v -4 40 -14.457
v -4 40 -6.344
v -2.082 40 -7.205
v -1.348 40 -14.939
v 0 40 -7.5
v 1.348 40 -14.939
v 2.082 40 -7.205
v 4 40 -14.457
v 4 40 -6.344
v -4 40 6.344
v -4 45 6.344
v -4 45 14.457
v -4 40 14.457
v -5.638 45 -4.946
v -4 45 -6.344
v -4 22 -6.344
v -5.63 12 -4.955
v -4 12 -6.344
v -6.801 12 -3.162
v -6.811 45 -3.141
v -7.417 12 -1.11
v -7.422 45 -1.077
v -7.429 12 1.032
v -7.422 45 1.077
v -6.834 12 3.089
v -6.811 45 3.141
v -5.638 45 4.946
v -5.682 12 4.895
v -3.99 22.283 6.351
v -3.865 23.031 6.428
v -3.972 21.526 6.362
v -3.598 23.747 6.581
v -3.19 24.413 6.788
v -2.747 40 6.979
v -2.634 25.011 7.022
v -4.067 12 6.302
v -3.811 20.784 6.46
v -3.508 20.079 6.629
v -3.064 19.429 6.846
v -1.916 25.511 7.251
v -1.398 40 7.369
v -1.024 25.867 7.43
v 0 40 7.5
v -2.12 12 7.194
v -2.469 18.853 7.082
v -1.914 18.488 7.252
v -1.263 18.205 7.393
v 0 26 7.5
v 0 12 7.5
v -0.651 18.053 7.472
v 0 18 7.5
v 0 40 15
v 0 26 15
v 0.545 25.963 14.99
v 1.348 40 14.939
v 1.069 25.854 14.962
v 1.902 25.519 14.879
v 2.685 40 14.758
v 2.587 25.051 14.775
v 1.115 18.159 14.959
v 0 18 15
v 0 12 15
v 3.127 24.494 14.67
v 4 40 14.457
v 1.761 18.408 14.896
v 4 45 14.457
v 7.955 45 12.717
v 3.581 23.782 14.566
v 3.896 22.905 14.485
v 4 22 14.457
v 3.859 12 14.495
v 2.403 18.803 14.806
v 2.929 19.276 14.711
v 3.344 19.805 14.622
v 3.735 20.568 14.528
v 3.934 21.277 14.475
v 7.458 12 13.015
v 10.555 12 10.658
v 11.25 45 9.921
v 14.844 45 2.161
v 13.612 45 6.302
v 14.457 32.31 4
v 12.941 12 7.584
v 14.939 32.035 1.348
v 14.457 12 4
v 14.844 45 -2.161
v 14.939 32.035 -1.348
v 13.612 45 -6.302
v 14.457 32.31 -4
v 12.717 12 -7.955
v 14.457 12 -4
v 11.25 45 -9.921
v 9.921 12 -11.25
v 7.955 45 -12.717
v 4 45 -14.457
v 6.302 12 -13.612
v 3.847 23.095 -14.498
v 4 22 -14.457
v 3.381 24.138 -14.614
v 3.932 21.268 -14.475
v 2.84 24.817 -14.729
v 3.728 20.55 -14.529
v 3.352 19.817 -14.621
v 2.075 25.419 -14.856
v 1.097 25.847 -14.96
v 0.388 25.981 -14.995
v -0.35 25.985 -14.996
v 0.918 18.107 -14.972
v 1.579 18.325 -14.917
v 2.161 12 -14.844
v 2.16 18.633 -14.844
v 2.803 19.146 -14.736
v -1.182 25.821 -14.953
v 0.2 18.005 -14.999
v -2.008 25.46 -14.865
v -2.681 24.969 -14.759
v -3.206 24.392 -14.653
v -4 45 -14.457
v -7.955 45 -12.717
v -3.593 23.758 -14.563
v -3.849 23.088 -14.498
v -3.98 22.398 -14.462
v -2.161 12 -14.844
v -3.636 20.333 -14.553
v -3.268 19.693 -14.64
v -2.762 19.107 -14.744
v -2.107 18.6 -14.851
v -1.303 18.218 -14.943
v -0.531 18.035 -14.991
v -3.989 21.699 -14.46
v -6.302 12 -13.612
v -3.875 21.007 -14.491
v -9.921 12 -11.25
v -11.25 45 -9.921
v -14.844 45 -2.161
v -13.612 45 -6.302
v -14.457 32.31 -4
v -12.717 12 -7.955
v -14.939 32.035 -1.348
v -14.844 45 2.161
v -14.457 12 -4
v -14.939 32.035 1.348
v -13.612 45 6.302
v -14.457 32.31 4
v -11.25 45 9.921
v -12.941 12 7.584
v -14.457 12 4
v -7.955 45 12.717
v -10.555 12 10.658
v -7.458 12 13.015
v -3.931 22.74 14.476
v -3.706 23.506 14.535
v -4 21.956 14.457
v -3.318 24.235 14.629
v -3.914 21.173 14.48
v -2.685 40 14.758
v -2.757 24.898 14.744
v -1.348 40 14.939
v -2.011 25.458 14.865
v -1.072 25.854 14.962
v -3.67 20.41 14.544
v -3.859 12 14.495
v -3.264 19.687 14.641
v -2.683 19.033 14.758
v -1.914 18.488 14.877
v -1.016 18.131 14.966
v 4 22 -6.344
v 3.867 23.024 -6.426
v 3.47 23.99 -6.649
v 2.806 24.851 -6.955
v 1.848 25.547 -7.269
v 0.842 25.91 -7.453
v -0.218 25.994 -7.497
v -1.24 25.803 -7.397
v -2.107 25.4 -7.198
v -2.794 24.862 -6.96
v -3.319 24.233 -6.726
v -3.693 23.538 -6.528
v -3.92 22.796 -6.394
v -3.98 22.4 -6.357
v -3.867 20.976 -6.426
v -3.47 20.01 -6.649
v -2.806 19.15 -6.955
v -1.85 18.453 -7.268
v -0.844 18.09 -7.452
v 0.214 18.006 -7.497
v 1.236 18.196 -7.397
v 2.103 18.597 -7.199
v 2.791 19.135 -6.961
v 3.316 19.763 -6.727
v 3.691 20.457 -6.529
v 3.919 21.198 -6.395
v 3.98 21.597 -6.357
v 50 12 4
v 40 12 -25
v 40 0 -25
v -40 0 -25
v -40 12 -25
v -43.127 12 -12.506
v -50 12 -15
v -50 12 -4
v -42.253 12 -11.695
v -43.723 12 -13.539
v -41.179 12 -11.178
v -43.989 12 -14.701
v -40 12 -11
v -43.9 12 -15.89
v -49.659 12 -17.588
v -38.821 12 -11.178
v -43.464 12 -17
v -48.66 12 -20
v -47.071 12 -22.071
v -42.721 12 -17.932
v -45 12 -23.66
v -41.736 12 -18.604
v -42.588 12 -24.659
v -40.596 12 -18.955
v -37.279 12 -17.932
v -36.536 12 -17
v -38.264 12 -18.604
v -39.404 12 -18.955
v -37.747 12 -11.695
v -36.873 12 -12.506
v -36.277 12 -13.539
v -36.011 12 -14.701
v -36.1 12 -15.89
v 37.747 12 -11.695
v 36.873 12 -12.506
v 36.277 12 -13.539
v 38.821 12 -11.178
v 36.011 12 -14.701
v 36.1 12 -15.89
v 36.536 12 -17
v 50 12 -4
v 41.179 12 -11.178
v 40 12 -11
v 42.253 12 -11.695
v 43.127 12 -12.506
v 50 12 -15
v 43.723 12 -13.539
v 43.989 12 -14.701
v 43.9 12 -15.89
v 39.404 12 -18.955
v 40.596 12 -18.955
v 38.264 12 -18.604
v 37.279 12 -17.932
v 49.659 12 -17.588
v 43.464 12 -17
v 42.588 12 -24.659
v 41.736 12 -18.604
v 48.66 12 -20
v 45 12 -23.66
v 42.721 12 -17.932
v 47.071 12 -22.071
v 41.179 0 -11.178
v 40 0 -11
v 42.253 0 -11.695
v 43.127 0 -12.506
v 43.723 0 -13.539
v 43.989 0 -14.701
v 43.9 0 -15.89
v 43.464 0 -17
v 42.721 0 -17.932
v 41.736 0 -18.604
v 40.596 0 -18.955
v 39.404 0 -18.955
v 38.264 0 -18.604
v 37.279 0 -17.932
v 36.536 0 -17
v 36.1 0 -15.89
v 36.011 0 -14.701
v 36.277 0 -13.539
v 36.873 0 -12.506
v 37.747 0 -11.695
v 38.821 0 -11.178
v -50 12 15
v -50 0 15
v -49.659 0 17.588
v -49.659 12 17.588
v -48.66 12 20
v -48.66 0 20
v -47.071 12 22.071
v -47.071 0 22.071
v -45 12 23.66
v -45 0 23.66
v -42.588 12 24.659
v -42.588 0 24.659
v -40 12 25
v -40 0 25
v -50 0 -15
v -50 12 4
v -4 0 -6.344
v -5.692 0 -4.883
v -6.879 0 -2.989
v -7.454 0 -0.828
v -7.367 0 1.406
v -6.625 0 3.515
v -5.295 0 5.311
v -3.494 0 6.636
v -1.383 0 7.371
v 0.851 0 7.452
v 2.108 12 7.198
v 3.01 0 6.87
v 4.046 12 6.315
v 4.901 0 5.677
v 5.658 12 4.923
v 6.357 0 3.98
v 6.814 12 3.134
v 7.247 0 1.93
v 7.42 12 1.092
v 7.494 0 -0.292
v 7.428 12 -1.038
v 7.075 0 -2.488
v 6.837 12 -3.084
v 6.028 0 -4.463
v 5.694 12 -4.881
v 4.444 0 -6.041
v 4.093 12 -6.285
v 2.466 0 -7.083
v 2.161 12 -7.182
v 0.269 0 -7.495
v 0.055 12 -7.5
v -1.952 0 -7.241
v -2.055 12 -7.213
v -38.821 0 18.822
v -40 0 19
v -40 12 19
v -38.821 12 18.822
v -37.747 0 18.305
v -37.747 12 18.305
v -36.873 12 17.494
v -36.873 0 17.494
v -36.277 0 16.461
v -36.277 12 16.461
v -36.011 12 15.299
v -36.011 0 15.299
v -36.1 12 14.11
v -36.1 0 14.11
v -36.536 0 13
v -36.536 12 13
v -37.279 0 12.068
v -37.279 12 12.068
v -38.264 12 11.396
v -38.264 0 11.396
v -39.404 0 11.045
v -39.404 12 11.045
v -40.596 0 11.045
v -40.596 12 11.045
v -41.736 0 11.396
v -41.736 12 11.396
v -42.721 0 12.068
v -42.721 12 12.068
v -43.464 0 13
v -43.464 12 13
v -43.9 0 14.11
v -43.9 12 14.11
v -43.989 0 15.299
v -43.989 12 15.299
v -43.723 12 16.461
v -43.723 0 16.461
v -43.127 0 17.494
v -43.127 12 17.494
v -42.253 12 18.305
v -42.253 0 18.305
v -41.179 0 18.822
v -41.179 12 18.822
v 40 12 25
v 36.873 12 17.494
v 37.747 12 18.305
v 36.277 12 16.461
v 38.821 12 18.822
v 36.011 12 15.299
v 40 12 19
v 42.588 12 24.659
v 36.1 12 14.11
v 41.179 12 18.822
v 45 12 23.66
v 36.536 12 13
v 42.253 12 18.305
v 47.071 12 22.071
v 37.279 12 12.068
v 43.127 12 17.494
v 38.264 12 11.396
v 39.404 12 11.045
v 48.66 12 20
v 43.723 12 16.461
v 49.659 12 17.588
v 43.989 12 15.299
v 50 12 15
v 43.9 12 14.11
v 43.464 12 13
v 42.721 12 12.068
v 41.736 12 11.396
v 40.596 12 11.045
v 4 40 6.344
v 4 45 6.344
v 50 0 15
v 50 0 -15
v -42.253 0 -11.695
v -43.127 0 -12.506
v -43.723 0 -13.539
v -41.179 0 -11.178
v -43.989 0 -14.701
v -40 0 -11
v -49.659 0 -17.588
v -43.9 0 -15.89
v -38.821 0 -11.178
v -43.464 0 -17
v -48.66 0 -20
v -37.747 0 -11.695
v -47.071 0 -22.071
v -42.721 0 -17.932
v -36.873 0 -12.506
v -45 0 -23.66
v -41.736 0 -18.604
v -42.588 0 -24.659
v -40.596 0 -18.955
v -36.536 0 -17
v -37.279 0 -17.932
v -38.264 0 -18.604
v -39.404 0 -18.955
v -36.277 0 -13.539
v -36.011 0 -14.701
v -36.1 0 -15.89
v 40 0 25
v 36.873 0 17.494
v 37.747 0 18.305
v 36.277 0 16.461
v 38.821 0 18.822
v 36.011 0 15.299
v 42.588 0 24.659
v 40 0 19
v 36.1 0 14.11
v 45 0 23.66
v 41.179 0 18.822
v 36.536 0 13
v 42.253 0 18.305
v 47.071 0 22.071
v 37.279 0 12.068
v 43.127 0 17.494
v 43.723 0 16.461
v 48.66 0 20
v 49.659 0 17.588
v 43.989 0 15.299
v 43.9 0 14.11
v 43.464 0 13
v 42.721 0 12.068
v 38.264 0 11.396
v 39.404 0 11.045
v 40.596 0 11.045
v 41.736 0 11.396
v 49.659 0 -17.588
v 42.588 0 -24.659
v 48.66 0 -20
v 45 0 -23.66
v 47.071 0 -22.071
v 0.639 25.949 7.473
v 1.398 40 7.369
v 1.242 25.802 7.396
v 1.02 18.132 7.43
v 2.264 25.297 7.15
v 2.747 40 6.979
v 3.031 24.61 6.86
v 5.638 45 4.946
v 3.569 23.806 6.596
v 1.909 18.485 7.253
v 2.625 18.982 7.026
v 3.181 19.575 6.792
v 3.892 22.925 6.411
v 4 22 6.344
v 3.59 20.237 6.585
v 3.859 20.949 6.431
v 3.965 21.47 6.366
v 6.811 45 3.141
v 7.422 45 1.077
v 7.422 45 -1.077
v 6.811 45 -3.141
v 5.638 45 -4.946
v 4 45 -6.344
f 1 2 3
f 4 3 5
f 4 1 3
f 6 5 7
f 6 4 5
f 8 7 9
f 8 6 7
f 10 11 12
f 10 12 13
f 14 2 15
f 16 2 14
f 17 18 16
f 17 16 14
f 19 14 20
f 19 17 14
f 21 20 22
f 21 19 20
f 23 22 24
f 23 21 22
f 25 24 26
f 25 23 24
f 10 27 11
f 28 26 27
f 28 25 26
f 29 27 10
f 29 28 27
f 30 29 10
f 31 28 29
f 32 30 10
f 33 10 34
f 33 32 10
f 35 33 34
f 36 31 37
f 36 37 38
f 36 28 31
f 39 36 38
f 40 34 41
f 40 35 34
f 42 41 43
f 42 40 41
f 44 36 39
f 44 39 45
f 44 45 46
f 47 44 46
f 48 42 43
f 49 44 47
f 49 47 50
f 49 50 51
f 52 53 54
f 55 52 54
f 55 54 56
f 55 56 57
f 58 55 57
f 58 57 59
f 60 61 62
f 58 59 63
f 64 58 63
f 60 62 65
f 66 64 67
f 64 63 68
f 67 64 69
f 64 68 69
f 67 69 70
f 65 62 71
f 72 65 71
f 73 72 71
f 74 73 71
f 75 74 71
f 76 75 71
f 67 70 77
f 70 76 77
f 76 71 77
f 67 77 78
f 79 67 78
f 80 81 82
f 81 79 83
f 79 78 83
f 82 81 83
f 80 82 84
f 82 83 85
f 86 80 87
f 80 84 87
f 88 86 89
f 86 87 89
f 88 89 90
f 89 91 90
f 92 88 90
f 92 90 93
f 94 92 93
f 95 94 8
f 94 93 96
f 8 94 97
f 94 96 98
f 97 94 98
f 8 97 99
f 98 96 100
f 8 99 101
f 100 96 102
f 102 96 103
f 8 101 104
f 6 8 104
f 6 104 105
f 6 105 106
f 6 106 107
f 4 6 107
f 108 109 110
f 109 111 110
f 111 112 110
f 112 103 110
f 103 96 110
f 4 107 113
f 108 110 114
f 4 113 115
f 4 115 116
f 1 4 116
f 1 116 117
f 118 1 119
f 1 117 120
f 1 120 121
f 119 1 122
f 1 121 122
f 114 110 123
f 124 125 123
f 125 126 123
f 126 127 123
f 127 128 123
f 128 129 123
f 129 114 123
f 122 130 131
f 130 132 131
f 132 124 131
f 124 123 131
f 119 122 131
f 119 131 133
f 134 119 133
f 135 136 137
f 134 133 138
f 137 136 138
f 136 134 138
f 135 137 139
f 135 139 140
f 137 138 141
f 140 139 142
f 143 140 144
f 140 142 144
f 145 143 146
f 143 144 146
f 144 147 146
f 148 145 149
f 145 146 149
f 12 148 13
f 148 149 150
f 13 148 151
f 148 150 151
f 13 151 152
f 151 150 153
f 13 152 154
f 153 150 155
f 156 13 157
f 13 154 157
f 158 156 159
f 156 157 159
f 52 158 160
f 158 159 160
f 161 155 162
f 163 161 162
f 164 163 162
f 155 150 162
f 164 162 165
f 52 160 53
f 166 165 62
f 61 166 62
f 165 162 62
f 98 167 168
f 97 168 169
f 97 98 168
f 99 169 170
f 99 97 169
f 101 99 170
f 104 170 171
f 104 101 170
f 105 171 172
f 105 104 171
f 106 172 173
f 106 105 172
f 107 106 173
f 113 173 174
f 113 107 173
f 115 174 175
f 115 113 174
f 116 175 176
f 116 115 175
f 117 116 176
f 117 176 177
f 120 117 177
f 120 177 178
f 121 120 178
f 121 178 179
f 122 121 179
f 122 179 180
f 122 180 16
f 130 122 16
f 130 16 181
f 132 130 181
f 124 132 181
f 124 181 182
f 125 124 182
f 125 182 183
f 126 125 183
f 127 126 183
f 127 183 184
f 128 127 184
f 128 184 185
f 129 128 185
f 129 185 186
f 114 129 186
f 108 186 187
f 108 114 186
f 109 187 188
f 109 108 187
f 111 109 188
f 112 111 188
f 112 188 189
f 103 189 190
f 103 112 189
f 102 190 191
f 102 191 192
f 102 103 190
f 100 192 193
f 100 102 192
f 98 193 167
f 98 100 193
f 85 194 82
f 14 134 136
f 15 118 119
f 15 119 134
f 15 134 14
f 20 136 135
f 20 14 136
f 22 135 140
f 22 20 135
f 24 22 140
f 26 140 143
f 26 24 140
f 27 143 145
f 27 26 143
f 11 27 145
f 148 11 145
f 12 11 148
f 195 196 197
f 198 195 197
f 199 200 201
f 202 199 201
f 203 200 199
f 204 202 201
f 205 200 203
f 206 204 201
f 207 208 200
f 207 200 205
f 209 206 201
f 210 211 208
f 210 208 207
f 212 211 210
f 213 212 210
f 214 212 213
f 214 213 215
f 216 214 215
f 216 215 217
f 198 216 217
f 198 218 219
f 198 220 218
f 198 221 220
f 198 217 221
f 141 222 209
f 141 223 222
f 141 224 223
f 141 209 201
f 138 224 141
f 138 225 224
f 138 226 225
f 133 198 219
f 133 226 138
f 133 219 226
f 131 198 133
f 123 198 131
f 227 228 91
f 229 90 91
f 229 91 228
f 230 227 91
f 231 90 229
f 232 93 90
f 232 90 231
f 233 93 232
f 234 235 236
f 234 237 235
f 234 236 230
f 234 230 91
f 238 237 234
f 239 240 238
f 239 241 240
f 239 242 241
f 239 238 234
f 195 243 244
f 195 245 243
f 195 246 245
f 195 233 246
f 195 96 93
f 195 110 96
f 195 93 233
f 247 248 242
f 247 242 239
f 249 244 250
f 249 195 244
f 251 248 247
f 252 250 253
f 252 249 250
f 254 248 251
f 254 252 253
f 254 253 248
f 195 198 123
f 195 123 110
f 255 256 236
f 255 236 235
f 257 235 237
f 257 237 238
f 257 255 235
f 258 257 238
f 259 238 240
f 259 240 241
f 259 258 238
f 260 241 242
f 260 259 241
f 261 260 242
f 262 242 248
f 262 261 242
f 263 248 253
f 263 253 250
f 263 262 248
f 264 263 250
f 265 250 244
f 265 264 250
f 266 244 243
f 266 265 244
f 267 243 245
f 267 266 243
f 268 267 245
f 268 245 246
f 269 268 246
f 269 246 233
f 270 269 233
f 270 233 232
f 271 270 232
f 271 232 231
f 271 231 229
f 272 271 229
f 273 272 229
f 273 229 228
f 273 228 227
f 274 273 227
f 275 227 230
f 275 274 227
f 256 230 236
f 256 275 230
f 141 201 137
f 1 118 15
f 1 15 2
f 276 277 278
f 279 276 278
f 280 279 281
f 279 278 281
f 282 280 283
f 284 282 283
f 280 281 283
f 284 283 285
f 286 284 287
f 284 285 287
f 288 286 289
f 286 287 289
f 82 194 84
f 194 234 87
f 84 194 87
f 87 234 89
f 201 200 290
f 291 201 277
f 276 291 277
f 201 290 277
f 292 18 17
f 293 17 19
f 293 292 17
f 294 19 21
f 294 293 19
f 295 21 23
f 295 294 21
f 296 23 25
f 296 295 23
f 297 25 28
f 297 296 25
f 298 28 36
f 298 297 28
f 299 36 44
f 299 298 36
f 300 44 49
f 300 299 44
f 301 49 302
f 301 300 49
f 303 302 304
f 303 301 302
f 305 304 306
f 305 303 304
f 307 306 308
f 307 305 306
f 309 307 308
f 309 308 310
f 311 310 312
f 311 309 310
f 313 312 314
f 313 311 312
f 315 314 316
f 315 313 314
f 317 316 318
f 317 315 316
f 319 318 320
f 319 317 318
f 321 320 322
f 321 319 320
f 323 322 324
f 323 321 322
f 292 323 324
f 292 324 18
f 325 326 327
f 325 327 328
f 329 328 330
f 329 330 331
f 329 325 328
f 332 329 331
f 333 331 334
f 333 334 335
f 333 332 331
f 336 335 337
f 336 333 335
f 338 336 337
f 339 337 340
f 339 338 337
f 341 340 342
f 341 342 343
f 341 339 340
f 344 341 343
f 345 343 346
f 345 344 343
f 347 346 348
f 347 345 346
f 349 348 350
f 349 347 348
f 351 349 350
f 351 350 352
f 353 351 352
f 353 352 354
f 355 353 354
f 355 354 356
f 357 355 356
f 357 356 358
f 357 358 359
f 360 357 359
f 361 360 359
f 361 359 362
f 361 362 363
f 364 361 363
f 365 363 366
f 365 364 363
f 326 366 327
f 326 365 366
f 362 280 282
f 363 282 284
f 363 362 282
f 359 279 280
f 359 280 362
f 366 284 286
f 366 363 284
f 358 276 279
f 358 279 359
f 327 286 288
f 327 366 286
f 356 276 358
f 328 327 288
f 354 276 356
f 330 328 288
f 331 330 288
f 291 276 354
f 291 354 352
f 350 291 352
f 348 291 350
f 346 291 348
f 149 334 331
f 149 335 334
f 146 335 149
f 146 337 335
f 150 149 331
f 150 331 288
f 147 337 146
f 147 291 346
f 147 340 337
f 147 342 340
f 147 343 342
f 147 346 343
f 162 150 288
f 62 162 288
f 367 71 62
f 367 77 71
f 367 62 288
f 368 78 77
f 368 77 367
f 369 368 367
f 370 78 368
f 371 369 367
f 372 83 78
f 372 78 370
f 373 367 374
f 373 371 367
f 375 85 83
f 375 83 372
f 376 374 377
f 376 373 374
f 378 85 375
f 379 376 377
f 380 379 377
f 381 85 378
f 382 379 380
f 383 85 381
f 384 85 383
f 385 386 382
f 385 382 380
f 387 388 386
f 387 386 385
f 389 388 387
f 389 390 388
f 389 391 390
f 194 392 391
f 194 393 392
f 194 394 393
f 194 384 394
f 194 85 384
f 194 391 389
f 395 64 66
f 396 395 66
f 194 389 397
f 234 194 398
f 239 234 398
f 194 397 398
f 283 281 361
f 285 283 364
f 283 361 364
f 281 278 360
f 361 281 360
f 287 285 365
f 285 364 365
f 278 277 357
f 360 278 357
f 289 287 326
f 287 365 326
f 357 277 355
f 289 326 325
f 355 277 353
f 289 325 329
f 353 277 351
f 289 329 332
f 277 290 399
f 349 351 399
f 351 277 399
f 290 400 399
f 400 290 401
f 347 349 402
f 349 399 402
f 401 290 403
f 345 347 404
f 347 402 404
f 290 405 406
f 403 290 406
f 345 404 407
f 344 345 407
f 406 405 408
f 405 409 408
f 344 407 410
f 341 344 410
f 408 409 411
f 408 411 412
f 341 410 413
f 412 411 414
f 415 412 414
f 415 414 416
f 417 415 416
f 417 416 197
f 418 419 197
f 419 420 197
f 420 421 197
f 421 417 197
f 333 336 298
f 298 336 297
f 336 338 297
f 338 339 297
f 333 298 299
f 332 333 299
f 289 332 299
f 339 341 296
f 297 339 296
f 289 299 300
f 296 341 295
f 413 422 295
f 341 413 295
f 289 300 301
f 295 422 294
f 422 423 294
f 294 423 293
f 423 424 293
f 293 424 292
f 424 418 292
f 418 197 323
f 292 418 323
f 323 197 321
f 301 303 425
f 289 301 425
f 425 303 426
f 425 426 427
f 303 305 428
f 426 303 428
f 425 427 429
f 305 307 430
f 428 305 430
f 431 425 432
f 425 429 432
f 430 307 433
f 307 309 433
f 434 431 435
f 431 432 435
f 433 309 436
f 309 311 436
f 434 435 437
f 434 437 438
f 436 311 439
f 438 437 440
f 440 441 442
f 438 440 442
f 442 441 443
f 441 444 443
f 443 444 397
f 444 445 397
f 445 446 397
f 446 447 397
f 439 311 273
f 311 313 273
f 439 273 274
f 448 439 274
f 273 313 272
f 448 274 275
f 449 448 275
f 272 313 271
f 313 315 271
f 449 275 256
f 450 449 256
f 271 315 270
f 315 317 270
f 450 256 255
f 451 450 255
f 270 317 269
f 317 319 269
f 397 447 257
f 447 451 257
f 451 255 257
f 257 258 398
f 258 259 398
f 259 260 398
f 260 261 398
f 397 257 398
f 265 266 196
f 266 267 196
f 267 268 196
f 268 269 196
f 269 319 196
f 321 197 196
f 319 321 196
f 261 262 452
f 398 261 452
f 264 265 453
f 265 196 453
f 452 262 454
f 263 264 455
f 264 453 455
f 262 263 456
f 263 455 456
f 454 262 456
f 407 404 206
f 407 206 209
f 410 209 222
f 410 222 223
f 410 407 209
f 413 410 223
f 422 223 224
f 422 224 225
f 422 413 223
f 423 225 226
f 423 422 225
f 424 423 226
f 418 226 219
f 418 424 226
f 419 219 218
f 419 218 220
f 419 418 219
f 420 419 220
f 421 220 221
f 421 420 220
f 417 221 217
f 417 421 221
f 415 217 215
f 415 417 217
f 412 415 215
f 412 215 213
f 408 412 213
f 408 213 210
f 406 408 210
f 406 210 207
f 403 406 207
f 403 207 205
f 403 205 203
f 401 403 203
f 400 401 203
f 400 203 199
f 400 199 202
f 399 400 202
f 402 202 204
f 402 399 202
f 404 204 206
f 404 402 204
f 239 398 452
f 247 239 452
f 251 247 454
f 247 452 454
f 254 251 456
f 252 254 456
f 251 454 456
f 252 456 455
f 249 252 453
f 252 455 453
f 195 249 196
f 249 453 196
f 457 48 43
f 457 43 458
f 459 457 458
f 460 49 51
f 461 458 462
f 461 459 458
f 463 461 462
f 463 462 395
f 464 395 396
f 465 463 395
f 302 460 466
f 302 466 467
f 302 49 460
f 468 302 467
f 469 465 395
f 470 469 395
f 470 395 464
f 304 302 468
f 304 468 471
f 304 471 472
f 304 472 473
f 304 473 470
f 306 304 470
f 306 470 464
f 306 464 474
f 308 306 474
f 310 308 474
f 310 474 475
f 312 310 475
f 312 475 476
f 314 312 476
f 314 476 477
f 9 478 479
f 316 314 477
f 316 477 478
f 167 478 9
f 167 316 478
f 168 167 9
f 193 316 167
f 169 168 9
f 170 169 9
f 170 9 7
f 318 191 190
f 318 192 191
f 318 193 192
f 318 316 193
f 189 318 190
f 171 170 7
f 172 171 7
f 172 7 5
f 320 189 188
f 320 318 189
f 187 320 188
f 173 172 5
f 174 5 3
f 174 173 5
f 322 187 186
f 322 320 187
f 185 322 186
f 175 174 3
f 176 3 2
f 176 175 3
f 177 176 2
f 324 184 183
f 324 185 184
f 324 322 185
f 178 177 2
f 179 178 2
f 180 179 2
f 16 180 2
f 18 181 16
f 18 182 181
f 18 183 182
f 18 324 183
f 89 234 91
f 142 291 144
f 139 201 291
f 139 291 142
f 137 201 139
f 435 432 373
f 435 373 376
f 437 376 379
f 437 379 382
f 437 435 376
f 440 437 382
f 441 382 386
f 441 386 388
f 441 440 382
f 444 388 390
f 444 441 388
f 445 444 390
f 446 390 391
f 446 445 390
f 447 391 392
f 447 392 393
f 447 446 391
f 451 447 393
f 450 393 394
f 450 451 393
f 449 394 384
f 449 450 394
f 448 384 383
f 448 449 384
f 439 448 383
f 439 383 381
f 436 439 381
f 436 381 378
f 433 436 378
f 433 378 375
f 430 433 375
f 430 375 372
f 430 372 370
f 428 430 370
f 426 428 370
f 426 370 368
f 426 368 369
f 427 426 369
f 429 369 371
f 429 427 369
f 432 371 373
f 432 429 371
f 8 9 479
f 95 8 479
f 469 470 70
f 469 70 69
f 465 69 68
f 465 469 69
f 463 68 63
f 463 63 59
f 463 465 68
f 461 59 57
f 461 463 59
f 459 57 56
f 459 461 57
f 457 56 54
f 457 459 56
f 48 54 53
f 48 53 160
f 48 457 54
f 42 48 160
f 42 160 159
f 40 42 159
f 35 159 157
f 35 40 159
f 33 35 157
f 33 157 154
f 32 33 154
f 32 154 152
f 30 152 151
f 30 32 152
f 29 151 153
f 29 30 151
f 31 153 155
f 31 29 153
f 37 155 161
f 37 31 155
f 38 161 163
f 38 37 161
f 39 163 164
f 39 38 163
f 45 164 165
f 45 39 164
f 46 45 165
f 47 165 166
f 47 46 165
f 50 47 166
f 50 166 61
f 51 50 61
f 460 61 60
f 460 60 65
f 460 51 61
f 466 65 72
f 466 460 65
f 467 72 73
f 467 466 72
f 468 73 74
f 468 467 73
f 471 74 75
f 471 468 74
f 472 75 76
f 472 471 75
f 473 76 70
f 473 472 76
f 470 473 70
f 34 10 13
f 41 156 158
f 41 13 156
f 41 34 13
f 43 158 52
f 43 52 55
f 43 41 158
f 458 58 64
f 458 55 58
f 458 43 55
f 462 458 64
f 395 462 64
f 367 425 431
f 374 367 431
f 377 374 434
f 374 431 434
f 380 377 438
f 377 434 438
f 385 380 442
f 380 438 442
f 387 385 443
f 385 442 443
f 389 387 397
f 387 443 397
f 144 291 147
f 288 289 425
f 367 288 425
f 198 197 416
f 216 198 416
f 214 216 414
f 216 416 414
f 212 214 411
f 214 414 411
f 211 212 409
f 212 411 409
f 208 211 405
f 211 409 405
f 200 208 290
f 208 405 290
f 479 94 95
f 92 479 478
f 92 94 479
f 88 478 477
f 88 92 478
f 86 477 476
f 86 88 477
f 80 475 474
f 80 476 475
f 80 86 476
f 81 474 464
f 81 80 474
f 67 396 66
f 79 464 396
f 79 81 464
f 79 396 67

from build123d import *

# Parameters (mm, degrees)
SKETCH_1_R                = 4
EXTRUDE_2_DEPTH           = 12
SKETCH_4_R                = 15
SKETCH_4_R_2              = 7.5
EXTRUDE_3_DEPTH           = 33
CUT_EXTRUDE_12_DEPTH      = 84.815273071
CUT_EXTRUDE_12_DEPTH_BACK = 84.815273071
SKETCH_5_R                = 4
RIB_9_REACH               = 73.764
SKETCH_10_WALL_W          = 185.83828981
SKETCH_10_WALL_H          = 8
CUT_EXTRUDE_14_DEPTH      = 84.815273125
CUT_EXTRUDE_14_DEPTH_BACK = 84.815273125
CUT_EXTRUDE_15_DEPTH      = 72.763500535
CUT_EXTRUDE_15_DEPTH_BACK = 72.763500535
SKETCH_14_R               = 7.5


with BuildPart() as part:
    # 草图1 → 凸台-拉伸2 (new body)
    with BuildSketch(Plane(origin=(0, 0, 0), x_dir=(1, 0, 0), z_dir=(0, 1, 0))):
        with BuildLine():
            Line((-40, -25), (40, -25))
            ThreePointArc((40, -25), (47.071067812, -22.071067812), (50, -15))
            Line((50, -15), (50, 15))
            ThreePointArc((50, 15), (47.071067812, 22.071067812), (40, 25))
            Line((40, 25), (-40, 25))
            ThreePointArc((-40, 25), (-47.071067812, 22.071067812), (-50, 15))
            Line((-50, 15), (-50, -15))
            ThreePointArc((-50, -15), (-47.071067812, -22.071067812), (-40, -25))
        make_face()
        with Locations(Location((-40, 15, 0), (0, 0, 270))):
            Circle(SKETCH_1_R, mode=Mode.SUBTRACT)
        with Locations(Location((-40, -15, 0), (0, 0, 270))):
            Circle(SKETCH_1_R, mode=Mode.SUBTRACT)
        with Locations(Location((40, 15, 0), (0, 0, 270))):
            Circle(SKETCH_1_R, mode=Mode.SUBTRACT)
        with Locations(Location((40, -15, 0), (0, 0, 270))):
            Circle(SKETCH_1_R, mode=Mode.SUBTRACT)
    extrude(amount=EXTRUDE_2_DEPTH)

    # 草图4 → 凸台-拉伸3 (add)
    with BuildSketch(Plane(origin=(0, 12, 0), x_dir=(1, 0, 0), z_dir=(0, 1, 0))):
        with Locations(Location((0, 0, 0), (0, 0, 270))):
            Circle(SKETCH_4_R)
        with Locations(Location((0, 0, 0), (0, 0, 270))):
            Circle(SKETCH_4_R_2, mode=Mode.SUBTRACT)
    extrude(amount=EXTRUDE_3_DEPTH)

    # 草图5 → 切除-拉伸12 (cut, two sides: drawn at the far end of the back side and taken through both)
    with BuildSketch(Plane.XY.offset(25).offset(-CUT_EXTRUDE_12_DEPTH_BACK)):
        with Locations((0, 22)):
            Circle(SKETCH_5_R)
    extrude(amount=CUT_EXTRUDE_12_DEPTH + CUT_EXTRUDE_12_DEPTH_BACK, mode=Mode.SUBTRACT)

    # 草图10 wall → 筋9 (add, up to next)
    with BuildSketch(Plane(origin=(-32.5, 22, 0), x_dir=(0.868243142124, 0.496138938357, 0), z_dir=(-0.496138938357, 0.868243142124, 0)), mode=Mode.PRIVATE) as rib_9_sk1:
        Rectangle(SKETCH_10_WALL_W, SKETCH_10_WALL_H)
    rib_9_tool1 = extrude(rib_9_sk1.sketch, amount=-RIB_9_REACH, mode=Mode.PRIVATE) - part.part
    rib_9 = rib_9_tool1.solids().sort_by_distance((-32.5, 22, 0))[0]
    add(rib_9)

    # 草图13 → 切除-拉伸14 (cut, two sides: drawn at the far end of the back side and taken through both)
    with BuildSketch(Plane.XY.offset(25).offset(-CUT_EXTRUDE_14_DEPTH_BACK)):
        Polygon((0, 40), (4, 40), (4, 45), (0, 45), (-4, 45), (-4, 40), align=None)
    extrude(amount=CUT_EXTRUDE_14_DEPTH + CUT_EXTRUDE_14_DEPTH_BACK, mode=Mode.SUBTRACT)

    # 草图14 → 切除-拉伸15 (cut, two sides: drawn at the far end of the back side and taken through both)
    with BuildSketch(Plane(origin=(0, 0, 0), x_dir=(1, 0, 0), z_dir=(0, 1, 0)).offset(-CUT_EXTRUDE_15_DEPTH_BACK)):
        with Locations(Location((0, 0, 0), (0, 0, 122.230952636))):
            Circle(SKETCH_14_R)
    extrude(amount=CUT_EXTRUDE_15_DEPTH + CUT_EXTRUDE_15_DEPTH_BACK, mode=Mode.SUBTRACT)

    # 镜向1: 筋9 across plane
    add(rib_9.mirror(Plane(origin=(0, 0, 0), x_dir=(0, 0, 1), z_dir=(1, 0, 0))))


solid = part.part
